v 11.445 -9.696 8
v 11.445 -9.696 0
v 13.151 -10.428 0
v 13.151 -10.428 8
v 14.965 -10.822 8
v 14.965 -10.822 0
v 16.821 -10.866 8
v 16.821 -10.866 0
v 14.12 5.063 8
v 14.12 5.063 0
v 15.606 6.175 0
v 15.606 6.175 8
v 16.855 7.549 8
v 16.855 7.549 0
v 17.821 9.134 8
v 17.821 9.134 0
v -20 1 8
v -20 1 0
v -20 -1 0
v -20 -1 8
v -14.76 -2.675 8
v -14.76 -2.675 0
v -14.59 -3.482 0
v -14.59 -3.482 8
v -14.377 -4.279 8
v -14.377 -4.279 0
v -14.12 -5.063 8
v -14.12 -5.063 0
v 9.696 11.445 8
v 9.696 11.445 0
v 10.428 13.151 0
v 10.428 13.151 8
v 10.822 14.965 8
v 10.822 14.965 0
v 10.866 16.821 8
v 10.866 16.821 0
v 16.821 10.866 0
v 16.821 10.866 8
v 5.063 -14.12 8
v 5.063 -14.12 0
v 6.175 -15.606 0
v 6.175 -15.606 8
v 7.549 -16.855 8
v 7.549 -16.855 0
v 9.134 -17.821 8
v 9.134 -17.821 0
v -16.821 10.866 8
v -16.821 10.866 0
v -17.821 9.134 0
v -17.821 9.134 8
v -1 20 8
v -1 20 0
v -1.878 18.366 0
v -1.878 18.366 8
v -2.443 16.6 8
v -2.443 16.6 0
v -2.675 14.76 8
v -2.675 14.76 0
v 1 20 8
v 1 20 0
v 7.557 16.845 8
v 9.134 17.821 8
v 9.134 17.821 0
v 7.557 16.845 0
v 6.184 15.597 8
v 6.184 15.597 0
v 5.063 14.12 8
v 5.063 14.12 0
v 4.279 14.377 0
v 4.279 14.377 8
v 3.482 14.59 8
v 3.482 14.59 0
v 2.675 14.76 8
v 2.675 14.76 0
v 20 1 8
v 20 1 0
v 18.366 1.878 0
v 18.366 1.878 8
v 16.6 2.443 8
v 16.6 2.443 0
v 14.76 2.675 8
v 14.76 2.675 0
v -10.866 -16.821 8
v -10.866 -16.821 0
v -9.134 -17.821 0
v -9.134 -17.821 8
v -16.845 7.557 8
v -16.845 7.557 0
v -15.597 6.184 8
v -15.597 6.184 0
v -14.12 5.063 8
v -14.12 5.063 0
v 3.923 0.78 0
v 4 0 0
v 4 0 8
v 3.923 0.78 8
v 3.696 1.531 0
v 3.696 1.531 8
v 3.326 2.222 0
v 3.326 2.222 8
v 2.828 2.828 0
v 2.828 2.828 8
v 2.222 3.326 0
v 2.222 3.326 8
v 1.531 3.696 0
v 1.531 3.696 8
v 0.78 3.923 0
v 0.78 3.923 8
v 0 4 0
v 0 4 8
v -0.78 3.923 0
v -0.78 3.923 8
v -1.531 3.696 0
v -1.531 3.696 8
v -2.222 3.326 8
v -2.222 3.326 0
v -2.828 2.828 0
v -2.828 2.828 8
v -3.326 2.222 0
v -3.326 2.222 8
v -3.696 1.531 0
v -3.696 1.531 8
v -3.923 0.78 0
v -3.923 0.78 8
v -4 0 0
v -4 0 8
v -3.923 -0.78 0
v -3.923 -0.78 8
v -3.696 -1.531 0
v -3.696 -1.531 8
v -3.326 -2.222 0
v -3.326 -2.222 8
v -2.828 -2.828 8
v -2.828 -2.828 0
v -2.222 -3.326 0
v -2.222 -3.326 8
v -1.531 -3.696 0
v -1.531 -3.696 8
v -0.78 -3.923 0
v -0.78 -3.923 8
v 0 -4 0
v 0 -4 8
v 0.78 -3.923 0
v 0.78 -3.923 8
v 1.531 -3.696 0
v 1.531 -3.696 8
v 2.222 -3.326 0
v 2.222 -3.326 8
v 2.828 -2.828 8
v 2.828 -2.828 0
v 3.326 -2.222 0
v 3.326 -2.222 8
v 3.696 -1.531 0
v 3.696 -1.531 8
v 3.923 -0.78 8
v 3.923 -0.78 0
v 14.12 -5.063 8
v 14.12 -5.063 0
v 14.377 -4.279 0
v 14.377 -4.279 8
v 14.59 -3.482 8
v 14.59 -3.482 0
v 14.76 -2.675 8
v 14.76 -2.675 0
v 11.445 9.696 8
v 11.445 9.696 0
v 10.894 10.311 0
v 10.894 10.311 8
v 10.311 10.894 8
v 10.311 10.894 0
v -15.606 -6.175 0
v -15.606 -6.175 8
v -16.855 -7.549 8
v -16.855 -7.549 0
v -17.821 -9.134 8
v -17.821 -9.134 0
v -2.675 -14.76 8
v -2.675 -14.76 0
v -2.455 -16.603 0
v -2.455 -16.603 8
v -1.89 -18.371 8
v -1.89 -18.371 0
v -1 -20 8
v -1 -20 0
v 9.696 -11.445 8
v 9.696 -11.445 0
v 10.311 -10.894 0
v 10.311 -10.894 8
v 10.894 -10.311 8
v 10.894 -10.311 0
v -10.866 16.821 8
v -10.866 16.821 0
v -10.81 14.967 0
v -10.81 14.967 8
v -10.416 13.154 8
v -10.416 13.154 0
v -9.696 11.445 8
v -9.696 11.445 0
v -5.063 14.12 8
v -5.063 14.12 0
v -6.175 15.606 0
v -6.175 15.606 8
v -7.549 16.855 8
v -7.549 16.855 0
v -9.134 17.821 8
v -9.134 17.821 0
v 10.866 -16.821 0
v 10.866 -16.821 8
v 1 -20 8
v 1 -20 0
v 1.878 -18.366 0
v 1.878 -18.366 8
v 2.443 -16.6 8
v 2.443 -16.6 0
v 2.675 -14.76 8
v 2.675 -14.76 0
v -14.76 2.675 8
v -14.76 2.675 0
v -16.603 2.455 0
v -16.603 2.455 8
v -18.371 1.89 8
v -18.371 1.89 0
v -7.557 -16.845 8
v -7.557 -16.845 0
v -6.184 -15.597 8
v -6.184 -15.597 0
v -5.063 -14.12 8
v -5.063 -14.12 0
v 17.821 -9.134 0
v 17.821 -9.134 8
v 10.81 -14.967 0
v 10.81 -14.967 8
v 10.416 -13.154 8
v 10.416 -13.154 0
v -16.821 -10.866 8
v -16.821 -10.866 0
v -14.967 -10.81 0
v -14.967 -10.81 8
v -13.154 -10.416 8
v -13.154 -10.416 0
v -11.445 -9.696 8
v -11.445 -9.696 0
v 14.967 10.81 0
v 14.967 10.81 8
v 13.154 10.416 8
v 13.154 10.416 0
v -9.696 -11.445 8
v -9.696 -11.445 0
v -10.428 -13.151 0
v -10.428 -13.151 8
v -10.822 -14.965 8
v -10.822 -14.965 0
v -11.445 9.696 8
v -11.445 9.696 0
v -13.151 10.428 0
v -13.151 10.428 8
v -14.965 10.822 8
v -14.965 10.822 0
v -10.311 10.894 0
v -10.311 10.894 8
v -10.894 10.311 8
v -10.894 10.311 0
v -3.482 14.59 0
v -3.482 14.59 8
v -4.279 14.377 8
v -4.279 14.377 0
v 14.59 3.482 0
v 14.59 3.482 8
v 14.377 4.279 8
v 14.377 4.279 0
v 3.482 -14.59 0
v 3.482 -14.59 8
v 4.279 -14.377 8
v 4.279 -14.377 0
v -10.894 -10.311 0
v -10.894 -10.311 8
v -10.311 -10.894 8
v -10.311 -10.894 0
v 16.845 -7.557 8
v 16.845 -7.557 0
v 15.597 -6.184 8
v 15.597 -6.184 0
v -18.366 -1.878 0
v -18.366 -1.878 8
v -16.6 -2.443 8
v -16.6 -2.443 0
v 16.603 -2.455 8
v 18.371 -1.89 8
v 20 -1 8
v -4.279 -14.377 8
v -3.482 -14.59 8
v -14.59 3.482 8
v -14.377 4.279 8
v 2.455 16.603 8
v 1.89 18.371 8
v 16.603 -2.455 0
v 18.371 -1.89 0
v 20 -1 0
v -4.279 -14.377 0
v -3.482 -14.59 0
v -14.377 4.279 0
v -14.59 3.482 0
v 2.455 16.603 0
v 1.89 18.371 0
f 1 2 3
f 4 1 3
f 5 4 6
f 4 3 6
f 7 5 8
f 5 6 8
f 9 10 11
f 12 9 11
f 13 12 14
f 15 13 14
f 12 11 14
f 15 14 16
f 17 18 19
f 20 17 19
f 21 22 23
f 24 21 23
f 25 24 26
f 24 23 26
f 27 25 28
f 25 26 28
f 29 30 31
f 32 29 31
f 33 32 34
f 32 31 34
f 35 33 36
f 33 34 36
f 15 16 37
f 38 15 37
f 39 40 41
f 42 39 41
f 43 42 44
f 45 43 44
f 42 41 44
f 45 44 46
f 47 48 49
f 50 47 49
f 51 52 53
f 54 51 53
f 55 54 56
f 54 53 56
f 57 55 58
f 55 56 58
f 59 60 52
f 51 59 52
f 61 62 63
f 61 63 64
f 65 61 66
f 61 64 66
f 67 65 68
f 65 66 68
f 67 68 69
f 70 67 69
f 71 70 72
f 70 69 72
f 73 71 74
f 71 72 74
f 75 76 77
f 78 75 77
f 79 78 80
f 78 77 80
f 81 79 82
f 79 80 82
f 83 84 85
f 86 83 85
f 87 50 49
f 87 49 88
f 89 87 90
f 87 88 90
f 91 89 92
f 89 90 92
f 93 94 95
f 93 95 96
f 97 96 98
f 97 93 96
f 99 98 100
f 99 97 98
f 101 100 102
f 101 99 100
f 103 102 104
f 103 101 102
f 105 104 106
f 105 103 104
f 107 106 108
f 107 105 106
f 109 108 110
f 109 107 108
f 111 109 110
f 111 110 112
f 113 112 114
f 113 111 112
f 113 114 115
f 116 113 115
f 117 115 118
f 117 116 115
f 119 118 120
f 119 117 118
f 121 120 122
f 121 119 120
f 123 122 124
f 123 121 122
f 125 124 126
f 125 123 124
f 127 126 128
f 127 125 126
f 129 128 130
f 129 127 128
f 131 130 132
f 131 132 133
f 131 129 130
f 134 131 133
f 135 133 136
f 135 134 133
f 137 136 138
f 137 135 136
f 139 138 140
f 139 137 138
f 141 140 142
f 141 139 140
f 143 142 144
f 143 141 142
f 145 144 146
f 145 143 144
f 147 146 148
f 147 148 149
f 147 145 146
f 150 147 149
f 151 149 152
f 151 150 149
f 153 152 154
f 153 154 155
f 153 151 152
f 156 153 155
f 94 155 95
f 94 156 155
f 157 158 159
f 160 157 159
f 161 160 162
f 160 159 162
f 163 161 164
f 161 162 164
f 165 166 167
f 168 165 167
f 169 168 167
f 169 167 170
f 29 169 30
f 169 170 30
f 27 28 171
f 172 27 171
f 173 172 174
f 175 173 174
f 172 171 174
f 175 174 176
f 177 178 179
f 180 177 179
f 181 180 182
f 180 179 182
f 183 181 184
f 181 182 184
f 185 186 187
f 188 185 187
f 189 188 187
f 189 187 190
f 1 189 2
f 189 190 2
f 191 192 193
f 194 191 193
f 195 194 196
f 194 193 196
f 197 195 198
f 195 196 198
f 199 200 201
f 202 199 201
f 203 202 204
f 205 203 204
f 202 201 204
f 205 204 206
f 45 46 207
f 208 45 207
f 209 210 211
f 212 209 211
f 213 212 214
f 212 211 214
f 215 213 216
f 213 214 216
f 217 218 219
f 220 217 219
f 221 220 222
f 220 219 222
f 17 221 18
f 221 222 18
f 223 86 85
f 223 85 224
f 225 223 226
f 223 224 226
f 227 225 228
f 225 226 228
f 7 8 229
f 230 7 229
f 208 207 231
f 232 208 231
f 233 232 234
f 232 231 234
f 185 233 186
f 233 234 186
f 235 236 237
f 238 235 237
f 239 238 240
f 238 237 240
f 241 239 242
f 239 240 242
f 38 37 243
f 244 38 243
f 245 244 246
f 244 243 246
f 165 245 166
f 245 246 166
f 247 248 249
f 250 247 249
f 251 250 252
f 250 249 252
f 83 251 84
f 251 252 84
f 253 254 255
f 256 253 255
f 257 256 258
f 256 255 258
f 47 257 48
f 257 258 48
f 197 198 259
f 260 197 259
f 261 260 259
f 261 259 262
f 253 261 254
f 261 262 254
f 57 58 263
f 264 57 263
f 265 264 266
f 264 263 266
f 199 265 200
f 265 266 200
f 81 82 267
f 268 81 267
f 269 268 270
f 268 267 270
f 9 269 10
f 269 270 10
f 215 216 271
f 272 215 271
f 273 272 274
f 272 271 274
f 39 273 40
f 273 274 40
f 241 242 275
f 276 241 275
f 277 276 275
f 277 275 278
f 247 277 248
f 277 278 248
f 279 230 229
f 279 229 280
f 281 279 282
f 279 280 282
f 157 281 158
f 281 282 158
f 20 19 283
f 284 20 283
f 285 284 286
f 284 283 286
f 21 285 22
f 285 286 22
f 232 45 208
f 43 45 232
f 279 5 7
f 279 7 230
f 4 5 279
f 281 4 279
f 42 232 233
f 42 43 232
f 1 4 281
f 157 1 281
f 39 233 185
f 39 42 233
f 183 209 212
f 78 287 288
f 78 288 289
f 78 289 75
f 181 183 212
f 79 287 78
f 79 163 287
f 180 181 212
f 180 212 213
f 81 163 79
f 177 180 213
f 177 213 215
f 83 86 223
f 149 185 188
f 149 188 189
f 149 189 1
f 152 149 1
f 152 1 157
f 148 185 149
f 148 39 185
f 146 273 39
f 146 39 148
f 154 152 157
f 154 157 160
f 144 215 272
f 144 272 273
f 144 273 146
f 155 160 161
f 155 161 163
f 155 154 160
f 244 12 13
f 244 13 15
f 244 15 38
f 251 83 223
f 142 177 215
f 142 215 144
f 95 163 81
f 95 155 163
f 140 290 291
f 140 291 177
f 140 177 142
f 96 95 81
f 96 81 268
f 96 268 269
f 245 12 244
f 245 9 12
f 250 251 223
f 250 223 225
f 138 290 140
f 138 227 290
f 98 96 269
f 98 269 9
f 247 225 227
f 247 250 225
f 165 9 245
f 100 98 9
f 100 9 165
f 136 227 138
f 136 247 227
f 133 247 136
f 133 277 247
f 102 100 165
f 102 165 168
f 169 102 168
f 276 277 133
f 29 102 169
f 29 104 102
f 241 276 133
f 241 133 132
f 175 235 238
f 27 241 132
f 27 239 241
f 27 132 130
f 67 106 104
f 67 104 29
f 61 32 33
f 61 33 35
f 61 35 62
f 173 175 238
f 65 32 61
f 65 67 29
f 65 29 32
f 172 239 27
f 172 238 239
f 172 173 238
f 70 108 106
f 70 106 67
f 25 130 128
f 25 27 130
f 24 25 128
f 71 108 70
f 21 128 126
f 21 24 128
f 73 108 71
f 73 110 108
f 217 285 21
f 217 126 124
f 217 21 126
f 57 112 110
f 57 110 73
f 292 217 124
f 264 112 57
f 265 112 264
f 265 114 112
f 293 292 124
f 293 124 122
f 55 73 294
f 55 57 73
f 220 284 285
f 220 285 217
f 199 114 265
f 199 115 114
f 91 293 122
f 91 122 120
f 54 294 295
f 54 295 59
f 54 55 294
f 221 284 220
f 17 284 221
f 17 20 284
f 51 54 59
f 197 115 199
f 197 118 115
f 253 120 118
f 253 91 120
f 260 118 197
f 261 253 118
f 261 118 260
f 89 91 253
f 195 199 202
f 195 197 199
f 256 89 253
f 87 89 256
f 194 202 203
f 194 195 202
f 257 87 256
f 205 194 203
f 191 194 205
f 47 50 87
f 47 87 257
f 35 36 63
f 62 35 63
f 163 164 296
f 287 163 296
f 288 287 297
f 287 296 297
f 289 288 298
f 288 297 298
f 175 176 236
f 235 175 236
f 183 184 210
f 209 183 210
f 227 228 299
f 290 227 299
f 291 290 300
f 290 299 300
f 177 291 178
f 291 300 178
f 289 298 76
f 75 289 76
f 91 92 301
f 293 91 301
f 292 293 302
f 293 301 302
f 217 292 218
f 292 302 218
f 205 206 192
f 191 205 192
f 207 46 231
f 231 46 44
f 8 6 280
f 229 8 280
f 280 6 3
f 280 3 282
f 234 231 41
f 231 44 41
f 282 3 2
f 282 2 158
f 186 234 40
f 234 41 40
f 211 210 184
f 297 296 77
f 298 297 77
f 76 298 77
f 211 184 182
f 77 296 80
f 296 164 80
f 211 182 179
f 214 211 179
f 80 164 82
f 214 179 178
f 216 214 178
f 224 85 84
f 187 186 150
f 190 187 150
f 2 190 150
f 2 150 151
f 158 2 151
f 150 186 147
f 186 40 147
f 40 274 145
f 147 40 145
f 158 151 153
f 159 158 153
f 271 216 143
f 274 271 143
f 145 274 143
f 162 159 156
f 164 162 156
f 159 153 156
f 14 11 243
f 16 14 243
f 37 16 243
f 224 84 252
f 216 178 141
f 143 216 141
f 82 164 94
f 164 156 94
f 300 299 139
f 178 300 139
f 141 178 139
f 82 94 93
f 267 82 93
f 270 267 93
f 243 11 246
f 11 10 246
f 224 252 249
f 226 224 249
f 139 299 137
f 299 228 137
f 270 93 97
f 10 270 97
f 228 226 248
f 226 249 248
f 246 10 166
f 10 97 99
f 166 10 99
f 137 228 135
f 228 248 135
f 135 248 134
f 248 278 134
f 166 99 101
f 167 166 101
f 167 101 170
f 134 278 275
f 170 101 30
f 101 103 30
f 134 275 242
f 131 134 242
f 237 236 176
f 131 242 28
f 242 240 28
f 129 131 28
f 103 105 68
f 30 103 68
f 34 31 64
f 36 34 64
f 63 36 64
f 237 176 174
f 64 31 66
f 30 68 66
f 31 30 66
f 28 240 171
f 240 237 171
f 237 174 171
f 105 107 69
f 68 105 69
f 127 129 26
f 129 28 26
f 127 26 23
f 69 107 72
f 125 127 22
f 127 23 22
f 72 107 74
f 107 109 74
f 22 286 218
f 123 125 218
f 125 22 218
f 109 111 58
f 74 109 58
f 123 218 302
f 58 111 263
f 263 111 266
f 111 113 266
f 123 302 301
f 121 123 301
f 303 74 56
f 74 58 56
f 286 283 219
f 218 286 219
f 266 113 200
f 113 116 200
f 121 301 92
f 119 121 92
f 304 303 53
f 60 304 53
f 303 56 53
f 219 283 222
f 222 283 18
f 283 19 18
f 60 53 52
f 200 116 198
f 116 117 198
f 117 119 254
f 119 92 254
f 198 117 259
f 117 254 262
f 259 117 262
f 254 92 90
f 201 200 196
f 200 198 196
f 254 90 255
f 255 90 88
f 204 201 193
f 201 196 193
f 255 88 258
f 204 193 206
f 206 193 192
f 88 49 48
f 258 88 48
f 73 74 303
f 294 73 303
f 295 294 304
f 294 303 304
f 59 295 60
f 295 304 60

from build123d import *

# Parameters (mm, degrees)
SKETCH1_R           = 4
BOSS_EXTRUDE1_DEPTH = 8


with BuildPart() as part:
    # Sketch1 → Boss-Extrude1 (new body)
    with BuildSketch(Plane(origin=(0, 0, 0), x_dir=(0, 1, 0), z_dir=(0, 0, 1))):
        with BuildLine():
            ThreePointArc((16.820508076, 10.866025404), (14.05137554, 10.65443031), (11.444646973, 9.696393951))
            ThreePointArc((11.444646973, 9.696393951), (10.606601718, 10.606601718), (9.696393951, 11.444646973))
            ThreePointArc((9.696393951, 11.444646973), (10.668335485, 14.048350177), (10.866025404, 16.820508076))
            Line((10.866025404, 16.820508076), (9.133974596, 17.820508076))
            ThreePointArc((9.133974596, 17.820508076), (6.841633021, 16.252695081), (5.063158041, 14.119646973))
            ThreePointArc((5.063158041, 14.119646973), (3.882285677, 14.488887394), (2.675, 14.759551992))
            ThreePointArc((2.675, 14.759551992), (2.214874458, 17.500395877), (1, 20))
            Line((1, 20), (-1, 20))
            ThreePointArc((-1, 20), (-2.201319541, 17.496063331), (-2.675, 14.759551992))
            ThreePointArc((-2.675, 14.759551992), (-3.882285677, 14.488887394), (-5.063158041, 14.119646973))
            ThreePointArc((-5.063158041, 14.119646973), (-6.832060392, 16.263224635), (-9.133974596, 17.820508076))
            Line((-9.133974596, 17.820508076), (-10.866025404, 16.820508076))
            ThreePointArc((-10.866025404, 16.820508076), (-10.65443031, 14.05137554), (-9.696393951, 11.444646973))
            ThreePointArc((-9.696393951, 11.444646973), (-10.606601718, 10.606601718), (-11.444646973, 9.696393951))
            ThreePointArc((-11.444646973, 9.696393951), (-14.048350177, 10.668335485), (-16.820508076, 10.866025404))
            Line((-16.820508076, 10.866025404), (-17.820508076, 9.133974596))
            ThreePointArc((-17.820508076, 9.133974596), (-16.252695081, 6.841633021), (-14.119646973, 5.063158041))
            ThreePointArc((-14.119646973, 5.063158041), (-14.488887394, 3.882285677), (-14.759551992, 2.675))
            ThreePointArc((-14.759551992, 2.675), (-17.500395877, 2.214874458), (-20, 1))
            Line((-20, 1), (-20, -1))
            ThreePointArc((-20, -1), (-17.496063331, -2.201319541), (-14.759551992, -2.675))
            ThreePointArc((-14.759551992, -2.675), (-14.488887394, -3.882285677), (-14.119646973, -5.063158041))
            ThreePointArc((-14.119646973, -5.063158041), (-16.263224635, -6.832060392), (-17.820508076, -9.133974596))
            Line((-17.820508076, -9.133974596), (-16.820508076, -10.866025404))
            ThreePointArc((-16.820508076, -10.866025404), (-14.05137554, -10.65443031), (-11.444646973, -9.696393951))
            ThreePointArc((-11.444646973, -9.696393951), (-10.606601718, -10.606601718), (-9.696393951, -11.444646973))
            ThreePointArc((-9.696393951, -11.444646973), (-10.668335485, -14.048350177), (-10.866025404, -16.820508076))
            Line((-10.866025404, -16.820508076), (-9.133974596, -17.820508076))
            ThreePointArc((-9.133974596, -17.820508076), (-6.841633021, -16.252695081), (-5.063158041, -14.119646973))
            ThreePointArc((-5.063158041, -14.119646973), (-3.882285677, -14.488887394), (-2.675, -14.759551992))
            ThreePointArc((-2.675, -14.759551992), (-2.214874458, -17.500395877), (-1, -20))
            Line((-1, -20), (1, -20))
            ThreePointArc((1, -20), (2.201319541, -17.496063331), (2.675, -14.759551992))
            ThreePointArc((2.675, -14.759551992), (3.882285677, -14.488887394), (5.063158041, -14.119646973))
            ThreePointArc((5.063158041, -14.119646973), (6.832060392, -16.263224635), (9.133974596, -17.820508076))
            Line((9.133974596, -17.820508076), (10.866025404, -16.820508076))
            ThreePointArc((10.866025404, -16.820508076), (10.65443031, -14.05137554), (9.696393951, -11.444646973))
            ThreePointArc((9.696393951, -11.444646973), (10.606601718, -10.606601718), (11.444646973, -9.696393951))
            ThreePointArc((11.444646973, -9.696393951), (14.048350177, -10.668335485), (16.820508076, -10.866025404))
            Line((16.820508076, -10.866025404), (17.820508076, -9.133974596))
            ThreePointArc((17.820508076, -9.133974596), (16.252695081, -6.841633021), (14.119646973, -5.063158041))
            ThreePointArc((14.119646973, -5.063158041), (14.488887394, -3.882285677), (14.759551992, -2.675))
            ThreePointArc((14.759551992, -2.675), (17.500395877, -2.214874458), (20, -1))
            Line((20, -1), (20, 1))
            ThreePointArc((20, 1), (17.496063331, 2.201319541), (14.759551992, 2.675))
            ThreePointArc((14.759551992, 2.675), (14.488887394, 3.882285677), (14.119646973, 5.063158041))
            ThreePointArc((14.119646973, 5.063158041), (16.263224635, 6.832060392), (17.820508076, 9.133974596))
            Line((17.820508076, 9.133974596), (16.820508076, 10.866025404))
        make_face()
        with Locations(Location((0, 0, 0), (0, 0, 270))):
            Circle(SKETCH1_R, mode=Mode.SUBTRACT)
    extrude(amount=BOSS_EXTRUDE1_DEPTH)


solid = part.part
